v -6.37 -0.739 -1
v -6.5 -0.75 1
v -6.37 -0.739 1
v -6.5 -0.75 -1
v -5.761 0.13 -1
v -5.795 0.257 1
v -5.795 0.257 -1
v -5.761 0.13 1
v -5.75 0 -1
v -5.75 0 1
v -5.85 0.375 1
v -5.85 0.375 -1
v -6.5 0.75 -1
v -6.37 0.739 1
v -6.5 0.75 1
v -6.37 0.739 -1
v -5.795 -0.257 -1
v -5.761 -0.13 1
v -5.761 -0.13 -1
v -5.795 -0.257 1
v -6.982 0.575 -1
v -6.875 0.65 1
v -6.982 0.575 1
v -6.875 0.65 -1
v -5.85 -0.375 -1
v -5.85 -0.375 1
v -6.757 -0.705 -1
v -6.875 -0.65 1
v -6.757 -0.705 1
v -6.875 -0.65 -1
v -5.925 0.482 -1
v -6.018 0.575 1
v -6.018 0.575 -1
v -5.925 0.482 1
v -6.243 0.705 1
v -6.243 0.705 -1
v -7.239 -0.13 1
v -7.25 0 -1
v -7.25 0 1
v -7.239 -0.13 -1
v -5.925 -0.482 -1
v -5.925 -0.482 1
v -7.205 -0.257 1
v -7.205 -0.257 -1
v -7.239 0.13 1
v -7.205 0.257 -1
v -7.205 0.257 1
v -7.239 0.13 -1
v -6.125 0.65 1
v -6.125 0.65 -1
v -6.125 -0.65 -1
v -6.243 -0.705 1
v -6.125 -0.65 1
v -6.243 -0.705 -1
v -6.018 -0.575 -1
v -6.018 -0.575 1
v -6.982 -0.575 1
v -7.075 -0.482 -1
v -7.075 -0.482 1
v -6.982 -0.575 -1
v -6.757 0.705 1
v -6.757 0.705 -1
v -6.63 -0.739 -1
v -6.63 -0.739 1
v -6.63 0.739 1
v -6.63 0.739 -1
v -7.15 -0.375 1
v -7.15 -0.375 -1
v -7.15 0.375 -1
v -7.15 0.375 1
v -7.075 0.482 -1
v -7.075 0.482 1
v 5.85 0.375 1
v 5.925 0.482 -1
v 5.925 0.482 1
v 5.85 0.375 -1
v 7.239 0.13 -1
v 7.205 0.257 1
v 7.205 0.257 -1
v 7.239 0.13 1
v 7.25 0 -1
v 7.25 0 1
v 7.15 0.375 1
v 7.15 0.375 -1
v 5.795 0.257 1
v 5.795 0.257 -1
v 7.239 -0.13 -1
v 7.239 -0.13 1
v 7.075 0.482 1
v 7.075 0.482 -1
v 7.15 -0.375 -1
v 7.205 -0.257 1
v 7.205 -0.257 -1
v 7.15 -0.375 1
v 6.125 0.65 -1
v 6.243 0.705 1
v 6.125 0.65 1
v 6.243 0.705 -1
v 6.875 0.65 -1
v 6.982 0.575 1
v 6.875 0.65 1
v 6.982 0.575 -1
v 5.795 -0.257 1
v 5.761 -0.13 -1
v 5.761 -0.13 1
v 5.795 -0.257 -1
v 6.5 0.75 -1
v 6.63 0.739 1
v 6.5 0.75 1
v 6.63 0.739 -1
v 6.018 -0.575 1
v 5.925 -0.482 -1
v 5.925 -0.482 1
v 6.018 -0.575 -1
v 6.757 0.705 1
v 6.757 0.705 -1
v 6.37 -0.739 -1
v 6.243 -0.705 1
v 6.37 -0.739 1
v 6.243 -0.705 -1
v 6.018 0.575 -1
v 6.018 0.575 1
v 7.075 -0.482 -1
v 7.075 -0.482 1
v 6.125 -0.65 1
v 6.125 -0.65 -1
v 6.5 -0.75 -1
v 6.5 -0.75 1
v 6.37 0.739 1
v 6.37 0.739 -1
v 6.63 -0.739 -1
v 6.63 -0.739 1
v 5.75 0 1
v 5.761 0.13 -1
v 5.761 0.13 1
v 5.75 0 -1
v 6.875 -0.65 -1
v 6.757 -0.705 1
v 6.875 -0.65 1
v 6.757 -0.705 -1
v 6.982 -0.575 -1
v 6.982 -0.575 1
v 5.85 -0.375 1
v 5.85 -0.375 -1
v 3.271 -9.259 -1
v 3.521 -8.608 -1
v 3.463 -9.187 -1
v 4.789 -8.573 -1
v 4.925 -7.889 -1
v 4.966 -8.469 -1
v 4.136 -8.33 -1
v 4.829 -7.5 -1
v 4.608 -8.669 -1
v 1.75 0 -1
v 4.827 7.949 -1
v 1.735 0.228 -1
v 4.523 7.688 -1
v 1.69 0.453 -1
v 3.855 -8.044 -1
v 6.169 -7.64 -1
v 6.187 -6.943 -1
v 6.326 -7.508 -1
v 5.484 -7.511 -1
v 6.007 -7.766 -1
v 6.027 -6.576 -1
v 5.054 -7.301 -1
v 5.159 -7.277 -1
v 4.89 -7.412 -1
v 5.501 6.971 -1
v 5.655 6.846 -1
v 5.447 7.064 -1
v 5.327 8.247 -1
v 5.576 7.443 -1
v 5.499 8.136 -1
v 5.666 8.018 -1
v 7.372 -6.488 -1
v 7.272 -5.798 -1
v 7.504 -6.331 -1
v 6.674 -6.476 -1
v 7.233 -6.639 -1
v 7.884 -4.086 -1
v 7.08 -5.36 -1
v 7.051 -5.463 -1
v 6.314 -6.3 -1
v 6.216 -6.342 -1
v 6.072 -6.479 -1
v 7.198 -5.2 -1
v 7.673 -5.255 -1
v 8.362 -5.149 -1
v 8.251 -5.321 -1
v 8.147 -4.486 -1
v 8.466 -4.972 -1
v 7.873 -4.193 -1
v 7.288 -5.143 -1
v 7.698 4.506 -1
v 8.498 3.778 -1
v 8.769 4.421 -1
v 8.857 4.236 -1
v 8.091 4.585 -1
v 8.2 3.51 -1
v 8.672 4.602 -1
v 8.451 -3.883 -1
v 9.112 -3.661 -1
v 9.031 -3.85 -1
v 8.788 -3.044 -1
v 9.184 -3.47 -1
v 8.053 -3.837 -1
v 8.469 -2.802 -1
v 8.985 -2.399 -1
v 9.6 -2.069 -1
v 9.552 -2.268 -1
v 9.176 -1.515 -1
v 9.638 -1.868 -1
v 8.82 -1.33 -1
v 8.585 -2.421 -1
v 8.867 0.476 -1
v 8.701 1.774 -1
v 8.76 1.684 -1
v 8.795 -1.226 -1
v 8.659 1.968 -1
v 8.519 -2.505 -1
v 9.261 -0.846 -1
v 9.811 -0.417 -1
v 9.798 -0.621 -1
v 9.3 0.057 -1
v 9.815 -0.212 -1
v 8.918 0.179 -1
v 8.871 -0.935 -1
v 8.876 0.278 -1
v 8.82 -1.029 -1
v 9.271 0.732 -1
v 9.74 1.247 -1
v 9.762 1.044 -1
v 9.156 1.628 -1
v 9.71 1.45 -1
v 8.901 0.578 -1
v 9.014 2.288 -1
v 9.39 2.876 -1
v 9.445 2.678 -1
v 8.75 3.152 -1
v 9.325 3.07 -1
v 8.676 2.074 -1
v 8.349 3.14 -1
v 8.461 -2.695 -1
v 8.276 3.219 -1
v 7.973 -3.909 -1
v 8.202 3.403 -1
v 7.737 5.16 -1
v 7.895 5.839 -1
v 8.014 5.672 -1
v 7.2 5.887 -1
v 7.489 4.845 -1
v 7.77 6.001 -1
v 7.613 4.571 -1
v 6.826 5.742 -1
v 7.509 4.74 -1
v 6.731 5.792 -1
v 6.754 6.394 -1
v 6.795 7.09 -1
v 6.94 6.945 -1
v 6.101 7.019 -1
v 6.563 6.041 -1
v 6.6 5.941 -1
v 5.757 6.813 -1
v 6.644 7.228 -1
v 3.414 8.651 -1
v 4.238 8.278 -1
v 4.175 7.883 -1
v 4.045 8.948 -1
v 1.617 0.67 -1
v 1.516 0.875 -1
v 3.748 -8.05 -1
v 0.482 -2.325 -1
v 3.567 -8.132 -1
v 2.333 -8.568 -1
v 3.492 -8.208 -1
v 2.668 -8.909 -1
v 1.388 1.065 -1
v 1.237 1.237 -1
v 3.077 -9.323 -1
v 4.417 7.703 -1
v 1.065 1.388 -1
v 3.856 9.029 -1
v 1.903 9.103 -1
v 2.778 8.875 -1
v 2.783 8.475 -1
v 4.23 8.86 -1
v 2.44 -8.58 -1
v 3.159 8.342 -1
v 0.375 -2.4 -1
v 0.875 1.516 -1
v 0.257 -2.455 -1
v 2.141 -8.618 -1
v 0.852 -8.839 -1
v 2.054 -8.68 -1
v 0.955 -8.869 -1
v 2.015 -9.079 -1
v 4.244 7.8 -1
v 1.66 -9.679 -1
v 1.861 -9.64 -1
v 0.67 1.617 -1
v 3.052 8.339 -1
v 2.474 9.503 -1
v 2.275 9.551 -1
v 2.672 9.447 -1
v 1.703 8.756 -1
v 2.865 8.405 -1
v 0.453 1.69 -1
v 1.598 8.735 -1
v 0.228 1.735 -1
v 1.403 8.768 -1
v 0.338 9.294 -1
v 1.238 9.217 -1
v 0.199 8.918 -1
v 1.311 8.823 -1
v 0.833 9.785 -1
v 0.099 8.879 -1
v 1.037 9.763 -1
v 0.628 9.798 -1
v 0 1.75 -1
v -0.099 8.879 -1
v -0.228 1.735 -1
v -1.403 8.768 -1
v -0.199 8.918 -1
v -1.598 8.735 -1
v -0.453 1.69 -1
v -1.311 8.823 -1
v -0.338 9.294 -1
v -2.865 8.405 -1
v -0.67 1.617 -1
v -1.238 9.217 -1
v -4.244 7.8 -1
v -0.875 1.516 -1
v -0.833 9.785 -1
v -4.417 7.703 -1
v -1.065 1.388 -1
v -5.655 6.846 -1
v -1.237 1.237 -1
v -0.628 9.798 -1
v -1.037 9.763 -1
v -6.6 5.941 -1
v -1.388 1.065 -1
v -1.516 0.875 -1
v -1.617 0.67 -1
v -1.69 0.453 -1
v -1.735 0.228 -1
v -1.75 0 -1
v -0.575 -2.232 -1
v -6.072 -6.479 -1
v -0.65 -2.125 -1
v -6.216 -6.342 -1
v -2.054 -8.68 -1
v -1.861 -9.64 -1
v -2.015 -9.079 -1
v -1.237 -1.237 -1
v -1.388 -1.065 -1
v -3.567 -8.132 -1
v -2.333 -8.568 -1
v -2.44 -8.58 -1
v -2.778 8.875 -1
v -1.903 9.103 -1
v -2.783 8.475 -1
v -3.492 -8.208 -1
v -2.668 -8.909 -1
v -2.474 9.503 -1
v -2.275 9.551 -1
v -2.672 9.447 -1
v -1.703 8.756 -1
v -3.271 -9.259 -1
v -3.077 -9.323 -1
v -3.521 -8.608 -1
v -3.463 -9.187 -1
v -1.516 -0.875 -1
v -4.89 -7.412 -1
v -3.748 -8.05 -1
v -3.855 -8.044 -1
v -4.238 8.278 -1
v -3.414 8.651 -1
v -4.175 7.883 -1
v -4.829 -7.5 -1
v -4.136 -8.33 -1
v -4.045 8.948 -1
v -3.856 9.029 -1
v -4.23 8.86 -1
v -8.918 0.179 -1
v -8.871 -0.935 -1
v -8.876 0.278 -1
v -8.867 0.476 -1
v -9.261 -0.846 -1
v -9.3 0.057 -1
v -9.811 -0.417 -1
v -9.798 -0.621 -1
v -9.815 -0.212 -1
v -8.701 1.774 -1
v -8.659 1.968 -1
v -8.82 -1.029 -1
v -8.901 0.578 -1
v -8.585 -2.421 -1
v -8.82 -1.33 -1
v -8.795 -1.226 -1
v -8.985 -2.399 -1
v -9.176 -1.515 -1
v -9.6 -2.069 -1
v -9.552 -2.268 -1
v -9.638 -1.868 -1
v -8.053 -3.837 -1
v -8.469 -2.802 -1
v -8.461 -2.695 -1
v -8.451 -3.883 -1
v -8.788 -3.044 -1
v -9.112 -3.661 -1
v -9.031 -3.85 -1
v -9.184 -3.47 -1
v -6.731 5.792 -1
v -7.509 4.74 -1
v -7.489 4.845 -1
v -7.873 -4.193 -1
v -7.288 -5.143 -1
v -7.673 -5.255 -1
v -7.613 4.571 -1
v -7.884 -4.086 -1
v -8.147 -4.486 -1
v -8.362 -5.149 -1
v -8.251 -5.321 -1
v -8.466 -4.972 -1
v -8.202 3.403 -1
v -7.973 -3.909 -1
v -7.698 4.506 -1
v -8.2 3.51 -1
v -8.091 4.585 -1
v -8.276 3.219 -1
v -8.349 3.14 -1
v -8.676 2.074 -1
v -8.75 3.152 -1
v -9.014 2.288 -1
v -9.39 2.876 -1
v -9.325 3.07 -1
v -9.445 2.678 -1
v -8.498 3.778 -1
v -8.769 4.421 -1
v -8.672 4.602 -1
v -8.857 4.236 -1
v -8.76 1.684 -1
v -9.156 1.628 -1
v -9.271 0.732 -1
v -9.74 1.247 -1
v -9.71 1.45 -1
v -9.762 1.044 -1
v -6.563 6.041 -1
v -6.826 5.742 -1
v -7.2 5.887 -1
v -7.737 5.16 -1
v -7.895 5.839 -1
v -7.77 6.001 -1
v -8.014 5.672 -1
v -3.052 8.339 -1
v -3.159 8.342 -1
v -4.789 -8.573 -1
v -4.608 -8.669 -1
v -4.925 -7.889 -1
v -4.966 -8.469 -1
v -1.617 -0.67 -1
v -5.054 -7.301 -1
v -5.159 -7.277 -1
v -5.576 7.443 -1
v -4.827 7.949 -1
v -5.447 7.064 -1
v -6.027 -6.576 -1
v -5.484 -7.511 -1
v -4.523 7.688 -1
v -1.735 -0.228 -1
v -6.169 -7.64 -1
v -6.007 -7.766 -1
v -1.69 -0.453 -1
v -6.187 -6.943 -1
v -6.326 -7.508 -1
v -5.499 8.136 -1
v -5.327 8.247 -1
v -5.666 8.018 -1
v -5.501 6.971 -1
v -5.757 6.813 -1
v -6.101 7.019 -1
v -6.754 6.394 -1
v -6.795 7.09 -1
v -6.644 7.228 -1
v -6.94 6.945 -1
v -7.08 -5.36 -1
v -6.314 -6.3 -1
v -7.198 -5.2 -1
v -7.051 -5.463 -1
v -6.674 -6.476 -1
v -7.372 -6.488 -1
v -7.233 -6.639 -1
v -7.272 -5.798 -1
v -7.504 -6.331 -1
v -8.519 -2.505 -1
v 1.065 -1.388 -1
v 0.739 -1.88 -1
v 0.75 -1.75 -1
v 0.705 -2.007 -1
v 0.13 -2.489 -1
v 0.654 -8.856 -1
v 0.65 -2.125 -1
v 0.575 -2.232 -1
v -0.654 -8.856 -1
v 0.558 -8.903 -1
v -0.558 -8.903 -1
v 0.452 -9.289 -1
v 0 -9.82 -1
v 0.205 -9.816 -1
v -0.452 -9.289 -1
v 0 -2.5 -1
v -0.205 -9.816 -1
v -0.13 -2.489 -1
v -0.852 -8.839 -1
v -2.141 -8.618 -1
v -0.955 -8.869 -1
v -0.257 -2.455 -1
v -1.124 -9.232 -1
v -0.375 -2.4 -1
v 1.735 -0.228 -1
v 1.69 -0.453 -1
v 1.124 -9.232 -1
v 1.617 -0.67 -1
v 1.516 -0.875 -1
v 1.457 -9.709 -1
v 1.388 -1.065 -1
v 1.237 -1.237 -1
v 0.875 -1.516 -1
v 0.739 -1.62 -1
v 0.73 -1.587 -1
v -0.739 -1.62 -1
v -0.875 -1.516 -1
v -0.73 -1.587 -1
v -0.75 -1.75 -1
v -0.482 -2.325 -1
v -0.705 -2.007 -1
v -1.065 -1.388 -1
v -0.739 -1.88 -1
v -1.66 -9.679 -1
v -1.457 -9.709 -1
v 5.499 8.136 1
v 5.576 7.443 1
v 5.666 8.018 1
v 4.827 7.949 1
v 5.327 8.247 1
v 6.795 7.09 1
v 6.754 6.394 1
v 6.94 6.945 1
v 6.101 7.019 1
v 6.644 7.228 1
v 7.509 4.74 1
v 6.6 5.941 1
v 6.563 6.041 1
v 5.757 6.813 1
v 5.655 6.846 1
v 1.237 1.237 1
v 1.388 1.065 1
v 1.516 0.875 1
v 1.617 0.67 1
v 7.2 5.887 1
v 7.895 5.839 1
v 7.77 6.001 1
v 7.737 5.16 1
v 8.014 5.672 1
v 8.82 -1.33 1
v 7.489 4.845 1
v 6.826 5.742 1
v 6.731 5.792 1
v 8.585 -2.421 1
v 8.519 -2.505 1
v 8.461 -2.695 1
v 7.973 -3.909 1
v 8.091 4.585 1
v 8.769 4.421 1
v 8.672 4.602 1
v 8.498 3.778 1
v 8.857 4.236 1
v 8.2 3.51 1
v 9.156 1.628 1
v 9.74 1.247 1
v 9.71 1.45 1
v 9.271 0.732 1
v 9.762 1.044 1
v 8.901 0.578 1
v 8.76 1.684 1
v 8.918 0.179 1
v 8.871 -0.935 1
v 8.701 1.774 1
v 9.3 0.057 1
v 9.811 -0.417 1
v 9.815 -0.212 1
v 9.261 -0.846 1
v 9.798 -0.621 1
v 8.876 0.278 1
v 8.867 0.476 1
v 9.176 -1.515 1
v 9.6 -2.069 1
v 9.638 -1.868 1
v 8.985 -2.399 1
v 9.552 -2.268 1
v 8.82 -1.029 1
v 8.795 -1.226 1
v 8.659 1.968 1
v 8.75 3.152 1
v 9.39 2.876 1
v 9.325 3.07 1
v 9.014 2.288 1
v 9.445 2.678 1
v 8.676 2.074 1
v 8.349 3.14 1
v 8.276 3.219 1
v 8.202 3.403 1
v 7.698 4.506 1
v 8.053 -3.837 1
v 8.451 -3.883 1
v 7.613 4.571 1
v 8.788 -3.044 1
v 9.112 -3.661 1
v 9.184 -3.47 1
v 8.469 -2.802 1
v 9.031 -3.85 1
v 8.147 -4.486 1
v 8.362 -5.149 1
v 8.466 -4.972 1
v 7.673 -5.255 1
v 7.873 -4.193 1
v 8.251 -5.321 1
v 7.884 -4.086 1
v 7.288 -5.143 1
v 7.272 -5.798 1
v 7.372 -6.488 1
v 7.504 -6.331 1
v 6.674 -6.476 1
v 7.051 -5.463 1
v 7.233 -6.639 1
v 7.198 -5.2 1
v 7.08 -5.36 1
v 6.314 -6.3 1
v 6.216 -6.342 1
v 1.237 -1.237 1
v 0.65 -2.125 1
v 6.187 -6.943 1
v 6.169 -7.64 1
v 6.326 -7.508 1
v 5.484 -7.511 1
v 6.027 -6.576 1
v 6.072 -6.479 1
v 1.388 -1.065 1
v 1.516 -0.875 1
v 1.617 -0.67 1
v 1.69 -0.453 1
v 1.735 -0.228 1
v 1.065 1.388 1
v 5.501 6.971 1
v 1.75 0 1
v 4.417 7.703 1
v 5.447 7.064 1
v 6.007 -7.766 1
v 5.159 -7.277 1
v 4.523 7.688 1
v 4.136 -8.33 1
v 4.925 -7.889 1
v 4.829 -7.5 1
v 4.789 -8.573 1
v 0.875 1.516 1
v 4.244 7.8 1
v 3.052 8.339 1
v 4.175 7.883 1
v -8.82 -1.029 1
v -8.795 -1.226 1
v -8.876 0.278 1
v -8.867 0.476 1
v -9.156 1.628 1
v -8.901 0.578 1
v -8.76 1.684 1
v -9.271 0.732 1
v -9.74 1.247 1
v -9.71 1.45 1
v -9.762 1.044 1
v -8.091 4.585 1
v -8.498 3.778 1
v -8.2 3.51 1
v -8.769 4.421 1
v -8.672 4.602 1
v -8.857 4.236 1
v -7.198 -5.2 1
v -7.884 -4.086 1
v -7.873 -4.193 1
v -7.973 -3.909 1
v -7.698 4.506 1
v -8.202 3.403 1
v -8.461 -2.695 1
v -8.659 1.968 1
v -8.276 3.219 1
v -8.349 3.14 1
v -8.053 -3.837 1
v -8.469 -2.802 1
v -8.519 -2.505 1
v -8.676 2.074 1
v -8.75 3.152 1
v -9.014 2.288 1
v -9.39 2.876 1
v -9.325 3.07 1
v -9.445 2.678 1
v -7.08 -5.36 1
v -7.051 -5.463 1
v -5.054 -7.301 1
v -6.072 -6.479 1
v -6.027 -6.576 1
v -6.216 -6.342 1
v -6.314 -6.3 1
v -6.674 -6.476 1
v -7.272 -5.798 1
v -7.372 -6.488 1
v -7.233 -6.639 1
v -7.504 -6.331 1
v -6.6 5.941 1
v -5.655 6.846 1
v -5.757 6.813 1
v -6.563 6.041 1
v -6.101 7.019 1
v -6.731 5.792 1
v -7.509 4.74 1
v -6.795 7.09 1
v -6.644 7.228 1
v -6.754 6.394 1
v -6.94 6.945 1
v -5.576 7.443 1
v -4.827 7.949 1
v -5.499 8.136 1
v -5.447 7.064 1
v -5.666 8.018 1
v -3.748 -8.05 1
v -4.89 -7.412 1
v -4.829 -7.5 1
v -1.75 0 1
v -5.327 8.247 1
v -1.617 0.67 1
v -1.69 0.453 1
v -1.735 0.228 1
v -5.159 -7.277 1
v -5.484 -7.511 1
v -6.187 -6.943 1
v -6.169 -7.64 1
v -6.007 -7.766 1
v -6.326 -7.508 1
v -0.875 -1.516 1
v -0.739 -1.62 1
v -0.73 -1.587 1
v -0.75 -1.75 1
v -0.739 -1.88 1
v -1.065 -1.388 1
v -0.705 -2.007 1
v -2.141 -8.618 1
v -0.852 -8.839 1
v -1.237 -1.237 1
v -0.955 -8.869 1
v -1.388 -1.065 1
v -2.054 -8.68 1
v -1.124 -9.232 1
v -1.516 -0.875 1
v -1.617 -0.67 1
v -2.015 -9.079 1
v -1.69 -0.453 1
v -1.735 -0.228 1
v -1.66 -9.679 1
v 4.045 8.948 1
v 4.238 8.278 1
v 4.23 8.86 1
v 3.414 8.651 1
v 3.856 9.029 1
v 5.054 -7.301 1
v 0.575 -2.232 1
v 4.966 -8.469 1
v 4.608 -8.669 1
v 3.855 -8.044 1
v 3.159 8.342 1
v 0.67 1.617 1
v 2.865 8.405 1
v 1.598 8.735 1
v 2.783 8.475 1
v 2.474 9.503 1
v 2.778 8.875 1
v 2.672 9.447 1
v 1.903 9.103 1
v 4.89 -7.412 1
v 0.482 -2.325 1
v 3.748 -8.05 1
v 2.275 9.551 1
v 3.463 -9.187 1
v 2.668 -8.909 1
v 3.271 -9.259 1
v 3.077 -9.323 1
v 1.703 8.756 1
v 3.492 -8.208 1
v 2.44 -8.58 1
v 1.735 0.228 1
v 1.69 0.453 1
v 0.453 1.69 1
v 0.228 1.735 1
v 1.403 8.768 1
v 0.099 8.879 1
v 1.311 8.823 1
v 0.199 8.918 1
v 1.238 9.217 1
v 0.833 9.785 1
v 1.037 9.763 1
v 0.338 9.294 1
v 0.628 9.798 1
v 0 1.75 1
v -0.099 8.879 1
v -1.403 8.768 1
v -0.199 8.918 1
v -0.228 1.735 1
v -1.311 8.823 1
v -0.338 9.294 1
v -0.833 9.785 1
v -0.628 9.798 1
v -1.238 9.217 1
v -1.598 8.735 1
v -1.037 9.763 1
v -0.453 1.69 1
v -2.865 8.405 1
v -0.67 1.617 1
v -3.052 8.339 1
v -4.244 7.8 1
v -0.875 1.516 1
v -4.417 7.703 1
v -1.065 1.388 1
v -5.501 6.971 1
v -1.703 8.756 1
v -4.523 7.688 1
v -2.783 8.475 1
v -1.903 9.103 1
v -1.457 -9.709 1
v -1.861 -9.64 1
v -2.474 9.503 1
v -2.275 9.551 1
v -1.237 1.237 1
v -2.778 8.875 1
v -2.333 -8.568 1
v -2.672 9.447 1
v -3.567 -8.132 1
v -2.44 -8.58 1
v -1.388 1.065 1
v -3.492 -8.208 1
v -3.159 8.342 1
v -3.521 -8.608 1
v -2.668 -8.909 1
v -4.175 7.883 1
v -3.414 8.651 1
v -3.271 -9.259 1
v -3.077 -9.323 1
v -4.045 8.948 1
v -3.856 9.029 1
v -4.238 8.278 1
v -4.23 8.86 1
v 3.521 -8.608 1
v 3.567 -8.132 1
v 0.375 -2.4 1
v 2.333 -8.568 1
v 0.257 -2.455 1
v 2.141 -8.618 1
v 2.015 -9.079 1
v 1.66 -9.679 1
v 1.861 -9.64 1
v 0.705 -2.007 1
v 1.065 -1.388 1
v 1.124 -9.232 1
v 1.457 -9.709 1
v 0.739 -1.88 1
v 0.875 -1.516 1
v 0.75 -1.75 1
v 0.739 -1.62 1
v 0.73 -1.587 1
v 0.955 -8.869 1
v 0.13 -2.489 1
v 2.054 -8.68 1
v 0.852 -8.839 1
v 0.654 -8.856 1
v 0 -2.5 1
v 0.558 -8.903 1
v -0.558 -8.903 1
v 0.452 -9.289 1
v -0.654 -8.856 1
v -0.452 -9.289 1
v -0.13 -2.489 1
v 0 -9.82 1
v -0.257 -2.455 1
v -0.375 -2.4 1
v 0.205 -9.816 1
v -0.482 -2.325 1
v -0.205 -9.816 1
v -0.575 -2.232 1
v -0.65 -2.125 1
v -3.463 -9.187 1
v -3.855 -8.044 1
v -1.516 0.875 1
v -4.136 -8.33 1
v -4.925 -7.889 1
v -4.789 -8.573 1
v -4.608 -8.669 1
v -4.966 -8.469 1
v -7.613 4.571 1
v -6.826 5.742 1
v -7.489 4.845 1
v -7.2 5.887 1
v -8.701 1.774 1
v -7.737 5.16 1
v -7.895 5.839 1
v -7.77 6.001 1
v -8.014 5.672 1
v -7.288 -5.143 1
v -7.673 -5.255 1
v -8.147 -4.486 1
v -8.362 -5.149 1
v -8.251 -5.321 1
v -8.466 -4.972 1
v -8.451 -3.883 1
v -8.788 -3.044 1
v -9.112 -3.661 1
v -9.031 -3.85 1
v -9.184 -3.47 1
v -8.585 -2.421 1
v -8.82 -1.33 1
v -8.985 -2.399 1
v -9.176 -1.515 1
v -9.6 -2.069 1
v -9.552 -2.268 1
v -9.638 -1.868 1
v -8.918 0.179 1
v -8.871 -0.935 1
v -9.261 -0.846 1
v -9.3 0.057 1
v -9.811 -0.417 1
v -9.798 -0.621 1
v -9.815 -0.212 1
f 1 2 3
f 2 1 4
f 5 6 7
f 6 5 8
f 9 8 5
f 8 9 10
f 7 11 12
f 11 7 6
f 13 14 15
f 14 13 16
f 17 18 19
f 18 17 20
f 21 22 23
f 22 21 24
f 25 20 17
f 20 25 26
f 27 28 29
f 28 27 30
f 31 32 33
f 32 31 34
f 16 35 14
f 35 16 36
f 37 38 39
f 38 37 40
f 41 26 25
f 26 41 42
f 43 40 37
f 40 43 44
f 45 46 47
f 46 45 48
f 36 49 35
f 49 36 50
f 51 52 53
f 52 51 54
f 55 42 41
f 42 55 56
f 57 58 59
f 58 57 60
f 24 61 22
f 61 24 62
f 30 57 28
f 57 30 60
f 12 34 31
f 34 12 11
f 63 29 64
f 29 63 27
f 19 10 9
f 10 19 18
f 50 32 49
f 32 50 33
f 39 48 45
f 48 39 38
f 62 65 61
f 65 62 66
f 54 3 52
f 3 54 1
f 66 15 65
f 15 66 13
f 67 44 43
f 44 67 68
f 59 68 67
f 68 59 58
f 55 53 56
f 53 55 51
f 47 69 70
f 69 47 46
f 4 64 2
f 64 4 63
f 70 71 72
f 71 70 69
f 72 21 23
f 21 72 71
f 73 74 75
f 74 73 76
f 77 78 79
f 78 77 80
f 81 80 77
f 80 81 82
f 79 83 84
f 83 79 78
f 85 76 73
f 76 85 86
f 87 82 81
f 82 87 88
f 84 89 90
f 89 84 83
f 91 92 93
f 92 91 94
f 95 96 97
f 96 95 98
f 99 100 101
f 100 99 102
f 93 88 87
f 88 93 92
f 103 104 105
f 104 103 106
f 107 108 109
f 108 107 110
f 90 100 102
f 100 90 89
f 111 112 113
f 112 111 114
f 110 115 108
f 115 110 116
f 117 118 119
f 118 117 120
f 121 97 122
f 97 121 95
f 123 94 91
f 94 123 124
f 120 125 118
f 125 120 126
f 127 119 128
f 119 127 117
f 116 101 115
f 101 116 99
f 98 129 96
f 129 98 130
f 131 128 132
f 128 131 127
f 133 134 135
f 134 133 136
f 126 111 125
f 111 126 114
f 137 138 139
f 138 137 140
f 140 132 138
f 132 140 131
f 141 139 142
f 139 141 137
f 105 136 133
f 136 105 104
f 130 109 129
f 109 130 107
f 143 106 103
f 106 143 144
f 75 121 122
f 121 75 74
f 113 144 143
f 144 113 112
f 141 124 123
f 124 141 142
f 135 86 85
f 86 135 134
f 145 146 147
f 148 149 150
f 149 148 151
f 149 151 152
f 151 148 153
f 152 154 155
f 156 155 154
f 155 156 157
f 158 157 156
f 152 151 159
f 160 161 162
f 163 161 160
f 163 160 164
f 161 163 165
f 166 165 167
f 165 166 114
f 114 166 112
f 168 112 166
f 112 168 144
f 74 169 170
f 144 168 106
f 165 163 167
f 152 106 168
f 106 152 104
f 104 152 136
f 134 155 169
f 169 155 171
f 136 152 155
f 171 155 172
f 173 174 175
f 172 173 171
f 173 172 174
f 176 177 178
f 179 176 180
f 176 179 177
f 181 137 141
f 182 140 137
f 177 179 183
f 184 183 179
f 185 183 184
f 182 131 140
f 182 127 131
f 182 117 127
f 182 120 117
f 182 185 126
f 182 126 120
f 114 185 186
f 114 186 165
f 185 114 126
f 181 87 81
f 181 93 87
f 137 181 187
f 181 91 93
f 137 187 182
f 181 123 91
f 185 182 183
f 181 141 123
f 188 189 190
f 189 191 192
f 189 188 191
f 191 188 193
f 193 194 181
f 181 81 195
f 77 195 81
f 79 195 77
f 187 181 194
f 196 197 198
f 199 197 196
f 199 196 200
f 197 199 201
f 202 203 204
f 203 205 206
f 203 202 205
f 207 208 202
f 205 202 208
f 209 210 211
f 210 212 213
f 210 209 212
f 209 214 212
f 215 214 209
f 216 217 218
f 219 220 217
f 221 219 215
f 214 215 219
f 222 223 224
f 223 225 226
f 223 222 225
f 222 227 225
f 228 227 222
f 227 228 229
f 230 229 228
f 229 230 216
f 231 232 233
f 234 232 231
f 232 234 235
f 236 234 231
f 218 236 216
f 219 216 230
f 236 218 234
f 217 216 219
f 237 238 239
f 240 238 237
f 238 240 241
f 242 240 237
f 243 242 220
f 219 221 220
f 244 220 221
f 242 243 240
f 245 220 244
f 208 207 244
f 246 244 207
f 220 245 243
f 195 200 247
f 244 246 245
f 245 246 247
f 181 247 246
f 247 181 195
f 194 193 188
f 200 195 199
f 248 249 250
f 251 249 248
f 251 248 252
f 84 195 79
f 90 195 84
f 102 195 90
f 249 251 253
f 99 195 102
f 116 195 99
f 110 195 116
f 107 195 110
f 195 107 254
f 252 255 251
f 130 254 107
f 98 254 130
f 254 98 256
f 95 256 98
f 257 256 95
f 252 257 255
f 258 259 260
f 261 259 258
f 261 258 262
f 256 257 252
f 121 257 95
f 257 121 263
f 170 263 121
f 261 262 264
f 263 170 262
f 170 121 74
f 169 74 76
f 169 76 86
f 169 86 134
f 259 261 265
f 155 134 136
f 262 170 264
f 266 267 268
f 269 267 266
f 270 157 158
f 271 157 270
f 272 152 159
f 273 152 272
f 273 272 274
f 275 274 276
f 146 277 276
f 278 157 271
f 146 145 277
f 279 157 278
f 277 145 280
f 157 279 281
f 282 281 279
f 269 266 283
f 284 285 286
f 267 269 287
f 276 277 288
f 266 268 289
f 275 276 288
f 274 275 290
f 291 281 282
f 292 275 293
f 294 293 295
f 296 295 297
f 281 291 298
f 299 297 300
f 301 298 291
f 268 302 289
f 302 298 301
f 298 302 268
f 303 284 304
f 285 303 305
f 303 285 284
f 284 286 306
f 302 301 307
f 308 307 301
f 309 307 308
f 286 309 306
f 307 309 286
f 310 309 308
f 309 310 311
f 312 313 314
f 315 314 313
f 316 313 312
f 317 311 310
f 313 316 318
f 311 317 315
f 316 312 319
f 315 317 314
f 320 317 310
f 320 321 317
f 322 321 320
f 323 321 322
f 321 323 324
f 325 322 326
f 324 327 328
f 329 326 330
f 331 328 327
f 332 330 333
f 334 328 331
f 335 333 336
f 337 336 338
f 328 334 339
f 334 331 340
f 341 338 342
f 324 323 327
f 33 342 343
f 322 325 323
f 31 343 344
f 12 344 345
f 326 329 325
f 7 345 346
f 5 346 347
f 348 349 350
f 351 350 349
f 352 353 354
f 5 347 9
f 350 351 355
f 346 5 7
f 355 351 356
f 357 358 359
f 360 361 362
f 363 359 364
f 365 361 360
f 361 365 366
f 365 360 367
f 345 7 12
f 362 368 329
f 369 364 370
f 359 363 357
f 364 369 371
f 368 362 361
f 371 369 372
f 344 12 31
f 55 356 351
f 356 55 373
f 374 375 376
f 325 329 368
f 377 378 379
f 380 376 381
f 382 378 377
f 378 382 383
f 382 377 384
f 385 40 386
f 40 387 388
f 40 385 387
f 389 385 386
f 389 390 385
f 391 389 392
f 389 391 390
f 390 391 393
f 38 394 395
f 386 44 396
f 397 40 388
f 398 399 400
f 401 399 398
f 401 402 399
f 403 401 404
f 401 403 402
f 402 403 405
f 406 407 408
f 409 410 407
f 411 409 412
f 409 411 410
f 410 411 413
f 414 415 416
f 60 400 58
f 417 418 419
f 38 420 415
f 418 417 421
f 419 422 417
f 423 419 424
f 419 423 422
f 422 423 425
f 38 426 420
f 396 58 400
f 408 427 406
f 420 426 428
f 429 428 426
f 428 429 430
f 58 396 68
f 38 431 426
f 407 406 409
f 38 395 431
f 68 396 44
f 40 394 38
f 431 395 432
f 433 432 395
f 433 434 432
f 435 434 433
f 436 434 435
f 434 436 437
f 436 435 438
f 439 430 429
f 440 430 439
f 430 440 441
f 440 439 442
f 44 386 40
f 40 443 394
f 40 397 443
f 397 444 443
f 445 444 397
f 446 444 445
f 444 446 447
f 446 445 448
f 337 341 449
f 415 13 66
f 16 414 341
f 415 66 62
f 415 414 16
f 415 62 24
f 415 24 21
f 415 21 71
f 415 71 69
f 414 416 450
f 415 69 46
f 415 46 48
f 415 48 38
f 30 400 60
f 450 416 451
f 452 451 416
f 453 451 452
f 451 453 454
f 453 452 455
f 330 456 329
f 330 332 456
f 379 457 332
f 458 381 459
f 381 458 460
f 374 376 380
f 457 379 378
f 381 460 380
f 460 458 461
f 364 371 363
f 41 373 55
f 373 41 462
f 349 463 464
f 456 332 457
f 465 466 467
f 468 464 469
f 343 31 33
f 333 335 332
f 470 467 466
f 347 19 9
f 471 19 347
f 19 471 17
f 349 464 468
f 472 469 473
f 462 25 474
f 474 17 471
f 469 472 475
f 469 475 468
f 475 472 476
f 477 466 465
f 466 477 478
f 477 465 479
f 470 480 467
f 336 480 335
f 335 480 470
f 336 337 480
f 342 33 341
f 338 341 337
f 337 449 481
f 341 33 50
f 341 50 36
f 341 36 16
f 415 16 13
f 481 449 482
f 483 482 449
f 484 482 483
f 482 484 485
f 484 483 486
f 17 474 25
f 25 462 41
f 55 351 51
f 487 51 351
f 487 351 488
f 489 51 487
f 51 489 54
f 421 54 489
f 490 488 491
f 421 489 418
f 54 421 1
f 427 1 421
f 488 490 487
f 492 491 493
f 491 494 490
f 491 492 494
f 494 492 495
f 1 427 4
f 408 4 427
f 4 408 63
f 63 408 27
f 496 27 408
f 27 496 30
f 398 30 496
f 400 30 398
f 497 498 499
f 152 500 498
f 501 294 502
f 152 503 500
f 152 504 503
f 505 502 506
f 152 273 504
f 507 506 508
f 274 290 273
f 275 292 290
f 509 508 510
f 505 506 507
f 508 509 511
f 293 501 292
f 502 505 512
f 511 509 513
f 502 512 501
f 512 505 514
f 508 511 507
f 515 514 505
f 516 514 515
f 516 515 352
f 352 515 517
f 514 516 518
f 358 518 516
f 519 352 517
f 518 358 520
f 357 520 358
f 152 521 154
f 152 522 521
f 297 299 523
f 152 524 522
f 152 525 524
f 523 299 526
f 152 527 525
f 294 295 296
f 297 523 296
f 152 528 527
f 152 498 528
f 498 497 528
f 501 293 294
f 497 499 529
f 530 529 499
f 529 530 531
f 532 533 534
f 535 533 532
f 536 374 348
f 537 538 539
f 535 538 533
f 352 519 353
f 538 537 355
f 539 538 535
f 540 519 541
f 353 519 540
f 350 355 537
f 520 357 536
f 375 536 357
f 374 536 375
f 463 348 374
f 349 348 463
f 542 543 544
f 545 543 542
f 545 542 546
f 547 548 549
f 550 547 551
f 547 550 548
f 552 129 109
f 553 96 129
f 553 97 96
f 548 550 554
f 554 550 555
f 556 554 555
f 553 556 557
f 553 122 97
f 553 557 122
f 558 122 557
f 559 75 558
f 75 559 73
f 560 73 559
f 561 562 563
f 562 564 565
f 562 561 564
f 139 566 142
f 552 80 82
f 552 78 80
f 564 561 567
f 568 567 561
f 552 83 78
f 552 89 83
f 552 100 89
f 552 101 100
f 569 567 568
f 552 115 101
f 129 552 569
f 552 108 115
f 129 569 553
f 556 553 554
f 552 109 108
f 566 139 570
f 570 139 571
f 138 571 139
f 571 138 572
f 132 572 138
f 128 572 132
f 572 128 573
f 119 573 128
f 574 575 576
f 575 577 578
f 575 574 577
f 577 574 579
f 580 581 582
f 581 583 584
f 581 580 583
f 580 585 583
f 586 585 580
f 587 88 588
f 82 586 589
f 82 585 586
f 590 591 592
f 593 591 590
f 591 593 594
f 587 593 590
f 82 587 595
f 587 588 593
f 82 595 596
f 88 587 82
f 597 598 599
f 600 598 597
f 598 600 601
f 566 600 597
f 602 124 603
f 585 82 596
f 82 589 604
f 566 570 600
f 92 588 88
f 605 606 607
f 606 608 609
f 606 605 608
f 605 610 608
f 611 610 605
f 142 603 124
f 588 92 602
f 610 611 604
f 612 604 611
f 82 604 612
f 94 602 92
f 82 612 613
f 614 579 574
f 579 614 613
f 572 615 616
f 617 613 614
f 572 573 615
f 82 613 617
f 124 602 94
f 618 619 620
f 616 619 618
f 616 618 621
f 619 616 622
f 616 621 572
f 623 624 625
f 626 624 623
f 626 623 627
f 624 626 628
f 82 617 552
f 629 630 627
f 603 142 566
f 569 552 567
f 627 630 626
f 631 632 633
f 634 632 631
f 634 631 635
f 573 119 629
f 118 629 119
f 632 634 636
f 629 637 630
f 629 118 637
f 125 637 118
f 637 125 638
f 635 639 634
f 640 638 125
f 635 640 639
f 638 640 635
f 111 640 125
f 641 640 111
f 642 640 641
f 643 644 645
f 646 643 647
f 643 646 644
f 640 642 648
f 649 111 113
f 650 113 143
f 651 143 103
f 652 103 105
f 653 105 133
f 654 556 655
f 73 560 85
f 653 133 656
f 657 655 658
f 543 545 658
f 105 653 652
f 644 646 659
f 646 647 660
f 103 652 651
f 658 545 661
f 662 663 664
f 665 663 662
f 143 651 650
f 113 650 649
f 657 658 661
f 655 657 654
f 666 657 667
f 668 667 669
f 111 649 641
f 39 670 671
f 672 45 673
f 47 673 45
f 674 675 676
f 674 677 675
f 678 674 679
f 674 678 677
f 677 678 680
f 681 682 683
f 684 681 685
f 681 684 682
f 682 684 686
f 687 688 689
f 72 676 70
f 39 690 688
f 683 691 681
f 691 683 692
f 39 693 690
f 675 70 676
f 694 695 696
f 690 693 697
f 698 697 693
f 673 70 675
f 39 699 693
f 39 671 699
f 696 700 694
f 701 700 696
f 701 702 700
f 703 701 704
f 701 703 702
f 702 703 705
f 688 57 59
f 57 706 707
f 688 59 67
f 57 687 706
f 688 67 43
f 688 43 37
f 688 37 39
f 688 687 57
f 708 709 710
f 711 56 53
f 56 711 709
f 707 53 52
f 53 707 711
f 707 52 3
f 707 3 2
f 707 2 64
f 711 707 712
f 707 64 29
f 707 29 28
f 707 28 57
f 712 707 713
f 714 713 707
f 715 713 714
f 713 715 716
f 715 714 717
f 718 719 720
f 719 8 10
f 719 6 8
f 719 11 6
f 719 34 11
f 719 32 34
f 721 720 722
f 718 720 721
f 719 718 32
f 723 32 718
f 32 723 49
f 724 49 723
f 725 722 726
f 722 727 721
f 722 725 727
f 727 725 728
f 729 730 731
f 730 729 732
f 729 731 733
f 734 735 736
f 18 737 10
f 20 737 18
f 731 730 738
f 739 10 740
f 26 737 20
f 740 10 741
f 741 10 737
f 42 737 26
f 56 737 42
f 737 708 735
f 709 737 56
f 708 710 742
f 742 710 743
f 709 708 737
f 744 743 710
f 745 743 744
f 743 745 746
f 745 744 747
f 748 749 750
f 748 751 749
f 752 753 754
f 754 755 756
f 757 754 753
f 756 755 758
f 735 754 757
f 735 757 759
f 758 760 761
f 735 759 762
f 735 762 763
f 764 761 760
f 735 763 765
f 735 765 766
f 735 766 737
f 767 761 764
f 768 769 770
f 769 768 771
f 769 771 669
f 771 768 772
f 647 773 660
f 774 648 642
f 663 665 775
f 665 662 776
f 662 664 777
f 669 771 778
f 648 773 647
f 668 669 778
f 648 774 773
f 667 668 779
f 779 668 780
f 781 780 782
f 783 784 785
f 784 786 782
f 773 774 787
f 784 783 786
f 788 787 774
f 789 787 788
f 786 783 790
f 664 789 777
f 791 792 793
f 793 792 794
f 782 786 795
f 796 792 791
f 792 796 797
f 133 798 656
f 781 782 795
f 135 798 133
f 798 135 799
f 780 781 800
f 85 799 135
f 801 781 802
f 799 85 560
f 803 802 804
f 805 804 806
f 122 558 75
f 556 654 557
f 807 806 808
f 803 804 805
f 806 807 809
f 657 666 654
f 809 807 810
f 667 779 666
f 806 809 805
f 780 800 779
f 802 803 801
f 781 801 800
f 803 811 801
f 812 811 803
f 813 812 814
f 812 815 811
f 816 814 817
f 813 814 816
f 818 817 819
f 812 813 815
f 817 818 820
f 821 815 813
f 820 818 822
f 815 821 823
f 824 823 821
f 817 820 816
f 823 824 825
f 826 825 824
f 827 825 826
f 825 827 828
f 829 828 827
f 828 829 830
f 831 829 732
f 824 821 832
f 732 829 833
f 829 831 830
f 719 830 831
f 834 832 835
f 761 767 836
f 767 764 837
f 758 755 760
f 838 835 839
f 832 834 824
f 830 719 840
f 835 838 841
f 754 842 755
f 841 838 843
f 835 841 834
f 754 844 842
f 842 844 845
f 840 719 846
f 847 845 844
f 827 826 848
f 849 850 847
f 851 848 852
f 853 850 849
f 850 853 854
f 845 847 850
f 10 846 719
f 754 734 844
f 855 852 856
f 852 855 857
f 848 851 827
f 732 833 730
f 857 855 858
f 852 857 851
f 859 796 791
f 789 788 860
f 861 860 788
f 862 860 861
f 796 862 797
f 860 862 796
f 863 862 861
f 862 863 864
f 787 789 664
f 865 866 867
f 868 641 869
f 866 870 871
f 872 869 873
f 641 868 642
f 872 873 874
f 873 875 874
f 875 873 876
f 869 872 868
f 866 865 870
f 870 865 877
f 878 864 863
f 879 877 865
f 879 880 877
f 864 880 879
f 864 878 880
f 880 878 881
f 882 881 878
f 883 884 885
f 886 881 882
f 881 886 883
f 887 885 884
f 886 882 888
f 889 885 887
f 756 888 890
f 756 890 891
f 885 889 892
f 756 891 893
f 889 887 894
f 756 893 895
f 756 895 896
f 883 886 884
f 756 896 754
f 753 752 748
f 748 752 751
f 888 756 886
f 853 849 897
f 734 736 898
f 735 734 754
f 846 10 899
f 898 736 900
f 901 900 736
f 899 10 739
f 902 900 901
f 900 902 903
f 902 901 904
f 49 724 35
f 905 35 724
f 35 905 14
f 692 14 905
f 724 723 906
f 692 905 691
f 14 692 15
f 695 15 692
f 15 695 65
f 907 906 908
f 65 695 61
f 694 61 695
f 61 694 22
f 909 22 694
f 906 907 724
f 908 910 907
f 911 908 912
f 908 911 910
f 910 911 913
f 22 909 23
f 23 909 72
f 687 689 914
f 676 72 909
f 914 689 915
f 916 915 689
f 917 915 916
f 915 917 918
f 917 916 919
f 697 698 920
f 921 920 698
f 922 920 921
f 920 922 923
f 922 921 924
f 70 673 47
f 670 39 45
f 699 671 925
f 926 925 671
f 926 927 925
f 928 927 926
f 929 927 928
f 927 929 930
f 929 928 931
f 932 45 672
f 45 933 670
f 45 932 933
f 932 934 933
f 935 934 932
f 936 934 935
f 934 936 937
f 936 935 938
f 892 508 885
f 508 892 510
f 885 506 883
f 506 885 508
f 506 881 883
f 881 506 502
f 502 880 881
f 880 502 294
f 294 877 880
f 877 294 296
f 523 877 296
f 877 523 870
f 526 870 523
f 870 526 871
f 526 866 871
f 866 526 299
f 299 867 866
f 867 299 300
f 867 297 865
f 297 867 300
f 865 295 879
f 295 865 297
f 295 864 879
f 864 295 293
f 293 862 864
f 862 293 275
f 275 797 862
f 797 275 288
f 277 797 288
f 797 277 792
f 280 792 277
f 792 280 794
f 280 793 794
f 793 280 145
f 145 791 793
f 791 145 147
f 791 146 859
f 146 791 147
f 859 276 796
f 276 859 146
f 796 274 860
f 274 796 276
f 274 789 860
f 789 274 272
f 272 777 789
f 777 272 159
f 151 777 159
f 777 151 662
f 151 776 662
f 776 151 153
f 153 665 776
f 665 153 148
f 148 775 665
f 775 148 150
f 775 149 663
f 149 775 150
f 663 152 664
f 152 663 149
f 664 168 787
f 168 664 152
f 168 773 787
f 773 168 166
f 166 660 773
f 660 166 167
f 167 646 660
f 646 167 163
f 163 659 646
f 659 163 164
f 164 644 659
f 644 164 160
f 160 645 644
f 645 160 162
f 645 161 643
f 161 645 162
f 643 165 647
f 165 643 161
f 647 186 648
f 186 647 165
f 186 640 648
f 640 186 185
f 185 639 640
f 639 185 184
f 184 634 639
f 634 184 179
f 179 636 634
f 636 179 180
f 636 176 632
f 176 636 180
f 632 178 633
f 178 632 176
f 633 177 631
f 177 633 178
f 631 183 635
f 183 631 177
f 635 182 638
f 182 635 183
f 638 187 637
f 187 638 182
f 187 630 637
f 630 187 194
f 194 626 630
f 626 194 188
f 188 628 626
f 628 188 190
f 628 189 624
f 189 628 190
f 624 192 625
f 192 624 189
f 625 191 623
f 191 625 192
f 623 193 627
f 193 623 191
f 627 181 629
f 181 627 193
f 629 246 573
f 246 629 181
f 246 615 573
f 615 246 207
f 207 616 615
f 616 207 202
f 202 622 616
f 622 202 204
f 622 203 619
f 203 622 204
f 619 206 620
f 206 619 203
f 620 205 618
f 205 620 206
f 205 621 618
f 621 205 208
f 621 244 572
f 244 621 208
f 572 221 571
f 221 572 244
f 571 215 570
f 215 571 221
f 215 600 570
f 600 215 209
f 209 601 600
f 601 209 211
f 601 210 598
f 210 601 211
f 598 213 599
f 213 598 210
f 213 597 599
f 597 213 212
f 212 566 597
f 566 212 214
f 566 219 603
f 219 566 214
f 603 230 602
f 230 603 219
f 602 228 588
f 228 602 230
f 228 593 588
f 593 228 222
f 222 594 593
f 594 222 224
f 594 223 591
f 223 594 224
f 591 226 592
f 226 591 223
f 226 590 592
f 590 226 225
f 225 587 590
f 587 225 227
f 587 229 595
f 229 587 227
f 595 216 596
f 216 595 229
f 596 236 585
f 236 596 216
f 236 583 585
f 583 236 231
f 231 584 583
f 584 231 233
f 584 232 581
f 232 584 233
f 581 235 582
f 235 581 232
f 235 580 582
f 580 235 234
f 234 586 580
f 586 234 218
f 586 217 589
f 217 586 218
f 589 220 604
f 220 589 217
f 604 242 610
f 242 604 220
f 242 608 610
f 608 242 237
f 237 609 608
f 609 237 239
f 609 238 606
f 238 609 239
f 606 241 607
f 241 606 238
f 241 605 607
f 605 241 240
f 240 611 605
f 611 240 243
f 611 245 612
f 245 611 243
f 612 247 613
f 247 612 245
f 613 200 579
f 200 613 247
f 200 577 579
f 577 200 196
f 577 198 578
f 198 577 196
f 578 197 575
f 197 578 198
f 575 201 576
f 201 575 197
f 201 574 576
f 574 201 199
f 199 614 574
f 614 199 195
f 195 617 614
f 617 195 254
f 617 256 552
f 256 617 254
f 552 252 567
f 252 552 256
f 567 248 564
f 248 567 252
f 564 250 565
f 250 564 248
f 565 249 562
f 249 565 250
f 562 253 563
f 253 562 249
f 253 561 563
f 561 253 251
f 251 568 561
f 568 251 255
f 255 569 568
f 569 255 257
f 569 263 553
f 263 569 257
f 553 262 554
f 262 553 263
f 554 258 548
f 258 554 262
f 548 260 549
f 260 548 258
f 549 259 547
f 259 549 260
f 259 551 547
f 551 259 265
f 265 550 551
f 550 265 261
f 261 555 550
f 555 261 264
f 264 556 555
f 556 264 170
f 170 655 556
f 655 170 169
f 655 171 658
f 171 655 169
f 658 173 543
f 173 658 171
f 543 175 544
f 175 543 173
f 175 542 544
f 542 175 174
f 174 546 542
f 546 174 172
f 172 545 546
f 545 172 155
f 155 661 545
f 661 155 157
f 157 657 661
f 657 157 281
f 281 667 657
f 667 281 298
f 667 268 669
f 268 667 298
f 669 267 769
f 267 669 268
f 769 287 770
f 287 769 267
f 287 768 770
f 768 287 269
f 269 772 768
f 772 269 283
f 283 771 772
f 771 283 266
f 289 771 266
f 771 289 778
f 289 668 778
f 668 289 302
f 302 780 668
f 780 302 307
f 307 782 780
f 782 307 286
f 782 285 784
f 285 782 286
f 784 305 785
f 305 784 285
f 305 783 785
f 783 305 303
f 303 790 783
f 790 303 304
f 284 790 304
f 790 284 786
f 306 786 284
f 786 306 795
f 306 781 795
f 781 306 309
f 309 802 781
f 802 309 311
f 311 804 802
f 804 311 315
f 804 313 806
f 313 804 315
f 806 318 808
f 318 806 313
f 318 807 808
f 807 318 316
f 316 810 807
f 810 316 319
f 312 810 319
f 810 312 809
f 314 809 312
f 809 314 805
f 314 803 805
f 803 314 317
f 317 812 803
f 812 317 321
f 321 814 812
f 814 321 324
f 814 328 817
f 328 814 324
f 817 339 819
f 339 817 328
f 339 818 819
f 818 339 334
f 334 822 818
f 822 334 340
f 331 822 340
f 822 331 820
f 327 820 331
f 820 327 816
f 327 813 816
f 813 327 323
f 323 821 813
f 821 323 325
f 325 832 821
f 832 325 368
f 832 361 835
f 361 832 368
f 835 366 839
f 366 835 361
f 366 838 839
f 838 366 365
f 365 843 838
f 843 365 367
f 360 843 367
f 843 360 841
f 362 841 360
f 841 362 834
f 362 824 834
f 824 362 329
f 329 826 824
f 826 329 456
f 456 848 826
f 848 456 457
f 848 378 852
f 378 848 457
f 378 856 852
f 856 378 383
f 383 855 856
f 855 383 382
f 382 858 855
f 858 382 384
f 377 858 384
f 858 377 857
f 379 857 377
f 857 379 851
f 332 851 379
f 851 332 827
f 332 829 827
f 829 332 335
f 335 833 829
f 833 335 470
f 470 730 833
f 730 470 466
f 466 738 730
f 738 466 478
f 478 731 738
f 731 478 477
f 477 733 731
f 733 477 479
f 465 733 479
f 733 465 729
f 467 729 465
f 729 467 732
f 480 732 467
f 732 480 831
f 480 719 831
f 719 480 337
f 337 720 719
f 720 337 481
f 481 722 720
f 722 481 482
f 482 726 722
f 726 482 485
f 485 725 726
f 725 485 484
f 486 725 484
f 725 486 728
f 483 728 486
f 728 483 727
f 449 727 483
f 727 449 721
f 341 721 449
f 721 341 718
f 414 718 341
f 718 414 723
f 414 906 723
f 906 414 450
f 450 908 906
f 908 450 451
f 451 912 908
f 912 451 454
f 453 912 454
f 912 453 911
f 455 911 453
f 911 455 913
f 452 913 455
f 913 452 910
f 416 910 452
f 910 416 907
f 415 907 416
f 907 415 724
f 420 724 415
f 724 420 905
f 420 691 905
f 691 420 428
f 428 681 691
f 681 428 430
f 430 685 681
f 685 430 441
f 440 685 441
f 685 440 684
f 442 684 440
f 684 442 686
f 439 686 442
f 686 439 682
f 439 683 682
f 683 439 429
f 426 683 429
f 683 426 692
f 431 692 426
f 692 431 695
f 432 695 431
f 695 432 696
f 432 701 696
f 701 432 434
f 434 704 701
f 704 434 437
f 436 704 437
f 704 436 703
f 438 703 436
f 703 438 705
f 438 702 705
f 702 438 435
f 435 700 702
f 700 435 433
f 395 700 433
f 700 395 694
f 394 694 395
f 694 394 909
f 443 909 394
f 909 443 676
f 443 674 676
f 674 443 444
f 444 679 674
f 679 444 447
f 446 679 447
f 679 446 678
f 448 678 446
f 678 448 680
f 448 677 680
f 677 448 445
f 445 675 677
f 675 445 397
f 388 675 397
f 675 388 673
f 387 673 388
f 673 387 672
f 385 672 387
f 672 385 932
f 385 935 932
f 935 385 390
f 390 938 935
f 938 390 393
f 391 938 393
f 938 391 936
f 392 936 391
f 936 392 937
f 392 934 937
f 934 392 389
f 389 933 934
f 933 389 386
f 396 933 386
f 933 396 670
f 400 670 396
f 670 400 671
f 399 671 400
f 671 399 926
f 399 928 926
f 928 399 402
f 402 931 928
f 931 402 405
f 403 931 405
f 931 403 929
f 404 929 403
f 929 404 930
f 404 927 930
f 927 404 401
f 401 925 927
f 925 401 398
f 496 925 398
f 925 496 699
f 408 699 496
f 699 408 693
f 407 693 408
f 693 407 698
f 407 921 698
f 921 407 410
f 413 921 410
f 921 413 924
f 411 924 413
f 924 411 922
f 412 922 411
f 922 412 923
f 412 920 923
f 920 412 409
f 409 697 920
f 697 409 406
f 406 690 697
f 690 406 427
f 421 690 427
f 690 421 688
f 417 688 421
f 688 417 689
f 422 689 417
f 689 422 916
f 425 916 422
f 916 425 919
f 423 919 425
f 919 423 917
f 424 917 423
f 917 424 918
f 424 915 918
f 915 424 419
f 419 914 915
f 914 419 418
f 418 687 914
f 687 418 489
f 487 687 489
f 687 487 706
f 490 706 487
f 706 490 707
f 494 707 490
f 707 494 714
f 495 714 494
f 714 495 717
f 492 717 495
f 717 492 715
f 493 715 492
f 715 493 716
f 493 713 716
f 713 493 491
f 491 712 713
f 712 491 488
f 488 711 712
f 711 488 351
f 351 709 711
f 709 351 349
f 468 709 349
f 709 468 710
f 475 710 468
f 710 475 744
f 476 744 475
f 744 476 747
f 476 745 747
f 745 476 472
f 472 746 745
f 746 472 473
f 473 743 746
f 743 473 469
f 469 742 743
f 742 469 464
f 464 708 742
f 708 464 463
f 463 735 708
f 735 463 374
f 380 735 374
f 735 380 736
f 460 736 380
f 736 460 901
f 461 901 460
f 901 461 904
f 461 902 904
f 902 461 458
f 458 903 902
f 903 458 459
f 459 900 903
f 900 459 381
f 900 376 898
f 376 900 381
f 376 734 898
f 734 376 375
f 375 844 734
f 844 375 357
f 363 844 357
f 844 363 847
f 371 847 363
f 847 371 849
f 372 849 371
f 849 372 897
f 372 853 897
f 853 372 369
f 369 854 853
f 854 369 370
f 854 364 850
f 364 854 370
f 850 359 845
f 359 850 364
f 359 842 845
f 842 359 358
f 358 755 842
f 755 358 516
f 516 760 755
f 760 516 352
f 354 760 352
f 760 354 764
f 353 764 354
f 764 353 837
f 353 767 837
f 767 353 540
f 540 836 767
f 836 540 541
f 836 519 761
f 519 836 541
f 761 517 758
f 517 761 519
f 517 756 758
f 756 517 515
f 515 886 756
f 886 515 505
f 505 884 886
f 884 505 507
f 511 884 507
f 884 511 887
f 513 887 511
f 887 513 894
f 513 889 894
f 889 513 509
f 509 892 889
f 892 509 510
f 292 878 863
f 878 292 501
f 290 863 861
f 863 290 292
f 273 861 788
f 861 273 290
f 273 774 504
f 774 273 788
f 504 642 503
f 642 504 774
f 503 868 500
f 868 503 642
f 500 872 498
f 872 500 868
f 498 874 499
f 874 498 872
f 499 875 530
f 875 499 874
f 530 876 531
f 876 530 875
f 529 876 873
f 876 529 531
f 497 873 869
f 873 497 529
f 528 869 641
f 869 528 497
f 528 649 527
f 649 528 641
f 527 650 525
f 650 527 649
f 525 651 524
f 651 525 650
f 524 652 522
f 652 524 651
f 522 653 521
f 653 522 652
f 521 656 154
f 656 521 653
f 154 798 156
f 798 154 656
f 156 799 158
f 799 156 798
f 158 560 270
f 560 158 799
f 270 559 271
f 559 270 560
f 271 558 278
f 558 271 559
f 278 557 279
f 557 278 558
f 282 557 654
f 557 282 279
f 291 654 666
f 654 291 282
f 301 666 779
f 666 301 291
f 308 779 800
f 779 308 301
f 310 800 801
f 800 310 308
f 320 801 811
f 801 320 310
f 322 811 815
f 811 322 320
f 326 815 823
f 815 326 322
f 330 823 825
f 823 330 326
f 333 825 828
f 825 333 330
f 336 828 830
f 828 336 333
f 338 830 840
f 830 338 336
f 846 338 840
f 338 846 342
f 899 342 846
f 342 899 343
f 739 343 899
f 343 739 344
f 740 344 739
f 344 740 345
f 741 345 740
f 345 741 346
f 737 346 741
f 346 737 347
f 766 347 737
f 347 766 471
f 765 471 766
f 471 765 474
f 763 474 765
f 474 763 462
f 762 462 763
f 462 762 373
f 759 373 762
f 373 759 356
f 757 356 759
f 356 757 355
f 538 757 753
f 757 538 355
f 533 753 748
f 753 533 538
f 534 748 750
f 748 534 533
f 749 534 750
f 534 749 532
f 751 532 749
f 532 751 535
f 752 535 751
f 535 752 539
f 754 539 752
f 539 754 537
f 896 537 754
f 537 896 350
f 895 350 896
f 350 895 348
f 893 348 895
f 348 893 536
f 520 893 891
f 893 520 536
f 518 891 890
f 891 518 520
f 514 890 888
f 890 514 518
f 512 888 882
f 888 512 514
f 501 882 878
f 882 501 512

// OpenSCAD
// part_id: c1
// name: C1 gear
// source_drawing_ids: DRW-004
// units: mm
// SPDX-License-Identifier: MIT
//
// Part C1: compound gear from the b/c gear train.
//
// Local origin convention:
// - XY origin is the gear rotation axis.
// - Z origin is the part midplane.
// - Assembly placement and animation should be applied outside this file.

function c1_polar(r, a_deg) = [r * cos(a_deg), r * sin(a_deg)];

module c1_tooth_gap_2d(
    outer_r = 9.82,
    root_r = 8.88,
    pitch_deg = 9.72973,
    tip_land_deg = 1.25,
    shoulder_r = 9.30,
    shoulder_deg = 2.08,
    throat_r = 8.92,
    throat_deg = 1.28,
    root_deg = 0.64,
    valley_r = 0.34
) {
    gap_half_deg = max((pitch_deg - tip_land_deg) / 2, throat_deg + 0.15);

    polygon(points = [
        c1_polar(outer_r + 0.2, -gap_half_deg),
        c1_polar(shoulder_r, -shoulder_deg),
        c1_polar(throat_r, -throat_deg),
        c1_polar(root_r, -root_deg),
        c1_polar(root_r, root_deg),
        c1_polar(throat_r, throat_deg),
        c1_polar(shoulder_r, shoulder_deg),
        c1_polar(outer_r + 0.2, gap_half_deg)
    ]);
}

module c1_gear_profile_2d(
    outer_d = 19.64,
    root_d = 17.76,
    tooth_count = 37,
    tip_land_deg = 1.25,
    shoulder_d = 18.60,
    shoulder_deg = 2.08,
    throat_d = 17.84,
    throat_deg = 1.28,
    root_deg = 0.64,
    valley_r = 0.34,
    tooth_cut_count = undef,
    tooth_cut_start = -1,
    tooth_cut_angle_deg = 90
) {
    pitch_deg = 360 / tooth_count;
    cut_count = is_undef(tooth_cut_count) ? tooth_count : tooth_cut_count;

    difference() {
        circle(d = outer_d, $fn = max(140, tooth_count * 4));
        for (i = [0 : cut_count - 1]) {
            rotate(tooth_cut_angle_deg + (tooth_cut_start + i) * pitch_deg)
                c1_tooth_gap_2d(
                    outer_r = outer_d / 2,
                    root_r = root_d / 2,
                    pitch_deg = pitch_deg,
                    tip_land_deg = tip_land_deg,
                    shoulder_r = shoulder_d / 2,
                    shoulder_deg = shoulder_deg,
                    throat_r = throat_d / 2,
                    throat_deg = throat_deg,
                    root_deg = root_deg,
                    valley_r = valley_r
                );
        }
    }
}

module c1_center_bore_2d(bore_d = 3.5, relief_r = 0.75) {
    union() {
        circle(d = bore_d, $fn = 48);
        // Center the lower relief on the outer edge of the main bore.
        translate([0, -bore_d / 2]) circle(r = relief_r, $fn = 36);
    }
}

module part_c1(
    outer_d = 19.64,
    thickness = 2.0,
    tooth_count = 37,
    root_d = 17.76,
    tip_land_deg = 1.25,
    shoulder_d = 18.60,
    shoulder_deg = 2.08,
    throat_d = 17.84,
    throat_deg = 1.28,
    root_deg = 0.64,
    valley_r = 0.34,
    tooth_cut_count = undef,
    tooth_cut_start = -1,
    tooth_cut_angle_deg = 90,
    bore_d = 3.5,
    lower_relief_r = 0.75,
    side_hole_d = 1.50,
    side_hole_radius = 6.50
) {
    difference() {
        linear_extrude(height = thickness, center = true)
            c1_gear_profile_2d(
                outer_d = outer_d,
                root_d = root_d,
                tooth_count = tooth_count,
                tip_land_deg = tip_land_deg,
                shoulder_d = shoulder_d,
                shoulder_deg = shoulder_deg,
                throat_d = throat_d,
                throat_deg = throat_deg,
                root_deg = root_deg,
                valley_r = valley_r,
                tooth_cut_count = tooth_cut_count,
                tooth_cut_start = tooth_cut_start,
                tooth_cut_angle_deg = tooth_cut_angle_deg
            );

        translate([0, 0, -thickness / 2 - 0.1])
            linear_extrude(height = thickness + 0.2)
                c1_center_bore_2d(
                    bore_d = bore_d,
                    relief_r = lower_relief_r
                );

        for (x = [-side_hole_radius, side_hole_radius]) {
            translate([x, 0, 0])
                cylinder(d = side_hole_d, h = thickness + 0.2, center = true, $fn = 36);
        }
    }
}

// ---- "main guard" ----
if (is_undef(__LIB_MODE__)) {
    part_c1();
}
